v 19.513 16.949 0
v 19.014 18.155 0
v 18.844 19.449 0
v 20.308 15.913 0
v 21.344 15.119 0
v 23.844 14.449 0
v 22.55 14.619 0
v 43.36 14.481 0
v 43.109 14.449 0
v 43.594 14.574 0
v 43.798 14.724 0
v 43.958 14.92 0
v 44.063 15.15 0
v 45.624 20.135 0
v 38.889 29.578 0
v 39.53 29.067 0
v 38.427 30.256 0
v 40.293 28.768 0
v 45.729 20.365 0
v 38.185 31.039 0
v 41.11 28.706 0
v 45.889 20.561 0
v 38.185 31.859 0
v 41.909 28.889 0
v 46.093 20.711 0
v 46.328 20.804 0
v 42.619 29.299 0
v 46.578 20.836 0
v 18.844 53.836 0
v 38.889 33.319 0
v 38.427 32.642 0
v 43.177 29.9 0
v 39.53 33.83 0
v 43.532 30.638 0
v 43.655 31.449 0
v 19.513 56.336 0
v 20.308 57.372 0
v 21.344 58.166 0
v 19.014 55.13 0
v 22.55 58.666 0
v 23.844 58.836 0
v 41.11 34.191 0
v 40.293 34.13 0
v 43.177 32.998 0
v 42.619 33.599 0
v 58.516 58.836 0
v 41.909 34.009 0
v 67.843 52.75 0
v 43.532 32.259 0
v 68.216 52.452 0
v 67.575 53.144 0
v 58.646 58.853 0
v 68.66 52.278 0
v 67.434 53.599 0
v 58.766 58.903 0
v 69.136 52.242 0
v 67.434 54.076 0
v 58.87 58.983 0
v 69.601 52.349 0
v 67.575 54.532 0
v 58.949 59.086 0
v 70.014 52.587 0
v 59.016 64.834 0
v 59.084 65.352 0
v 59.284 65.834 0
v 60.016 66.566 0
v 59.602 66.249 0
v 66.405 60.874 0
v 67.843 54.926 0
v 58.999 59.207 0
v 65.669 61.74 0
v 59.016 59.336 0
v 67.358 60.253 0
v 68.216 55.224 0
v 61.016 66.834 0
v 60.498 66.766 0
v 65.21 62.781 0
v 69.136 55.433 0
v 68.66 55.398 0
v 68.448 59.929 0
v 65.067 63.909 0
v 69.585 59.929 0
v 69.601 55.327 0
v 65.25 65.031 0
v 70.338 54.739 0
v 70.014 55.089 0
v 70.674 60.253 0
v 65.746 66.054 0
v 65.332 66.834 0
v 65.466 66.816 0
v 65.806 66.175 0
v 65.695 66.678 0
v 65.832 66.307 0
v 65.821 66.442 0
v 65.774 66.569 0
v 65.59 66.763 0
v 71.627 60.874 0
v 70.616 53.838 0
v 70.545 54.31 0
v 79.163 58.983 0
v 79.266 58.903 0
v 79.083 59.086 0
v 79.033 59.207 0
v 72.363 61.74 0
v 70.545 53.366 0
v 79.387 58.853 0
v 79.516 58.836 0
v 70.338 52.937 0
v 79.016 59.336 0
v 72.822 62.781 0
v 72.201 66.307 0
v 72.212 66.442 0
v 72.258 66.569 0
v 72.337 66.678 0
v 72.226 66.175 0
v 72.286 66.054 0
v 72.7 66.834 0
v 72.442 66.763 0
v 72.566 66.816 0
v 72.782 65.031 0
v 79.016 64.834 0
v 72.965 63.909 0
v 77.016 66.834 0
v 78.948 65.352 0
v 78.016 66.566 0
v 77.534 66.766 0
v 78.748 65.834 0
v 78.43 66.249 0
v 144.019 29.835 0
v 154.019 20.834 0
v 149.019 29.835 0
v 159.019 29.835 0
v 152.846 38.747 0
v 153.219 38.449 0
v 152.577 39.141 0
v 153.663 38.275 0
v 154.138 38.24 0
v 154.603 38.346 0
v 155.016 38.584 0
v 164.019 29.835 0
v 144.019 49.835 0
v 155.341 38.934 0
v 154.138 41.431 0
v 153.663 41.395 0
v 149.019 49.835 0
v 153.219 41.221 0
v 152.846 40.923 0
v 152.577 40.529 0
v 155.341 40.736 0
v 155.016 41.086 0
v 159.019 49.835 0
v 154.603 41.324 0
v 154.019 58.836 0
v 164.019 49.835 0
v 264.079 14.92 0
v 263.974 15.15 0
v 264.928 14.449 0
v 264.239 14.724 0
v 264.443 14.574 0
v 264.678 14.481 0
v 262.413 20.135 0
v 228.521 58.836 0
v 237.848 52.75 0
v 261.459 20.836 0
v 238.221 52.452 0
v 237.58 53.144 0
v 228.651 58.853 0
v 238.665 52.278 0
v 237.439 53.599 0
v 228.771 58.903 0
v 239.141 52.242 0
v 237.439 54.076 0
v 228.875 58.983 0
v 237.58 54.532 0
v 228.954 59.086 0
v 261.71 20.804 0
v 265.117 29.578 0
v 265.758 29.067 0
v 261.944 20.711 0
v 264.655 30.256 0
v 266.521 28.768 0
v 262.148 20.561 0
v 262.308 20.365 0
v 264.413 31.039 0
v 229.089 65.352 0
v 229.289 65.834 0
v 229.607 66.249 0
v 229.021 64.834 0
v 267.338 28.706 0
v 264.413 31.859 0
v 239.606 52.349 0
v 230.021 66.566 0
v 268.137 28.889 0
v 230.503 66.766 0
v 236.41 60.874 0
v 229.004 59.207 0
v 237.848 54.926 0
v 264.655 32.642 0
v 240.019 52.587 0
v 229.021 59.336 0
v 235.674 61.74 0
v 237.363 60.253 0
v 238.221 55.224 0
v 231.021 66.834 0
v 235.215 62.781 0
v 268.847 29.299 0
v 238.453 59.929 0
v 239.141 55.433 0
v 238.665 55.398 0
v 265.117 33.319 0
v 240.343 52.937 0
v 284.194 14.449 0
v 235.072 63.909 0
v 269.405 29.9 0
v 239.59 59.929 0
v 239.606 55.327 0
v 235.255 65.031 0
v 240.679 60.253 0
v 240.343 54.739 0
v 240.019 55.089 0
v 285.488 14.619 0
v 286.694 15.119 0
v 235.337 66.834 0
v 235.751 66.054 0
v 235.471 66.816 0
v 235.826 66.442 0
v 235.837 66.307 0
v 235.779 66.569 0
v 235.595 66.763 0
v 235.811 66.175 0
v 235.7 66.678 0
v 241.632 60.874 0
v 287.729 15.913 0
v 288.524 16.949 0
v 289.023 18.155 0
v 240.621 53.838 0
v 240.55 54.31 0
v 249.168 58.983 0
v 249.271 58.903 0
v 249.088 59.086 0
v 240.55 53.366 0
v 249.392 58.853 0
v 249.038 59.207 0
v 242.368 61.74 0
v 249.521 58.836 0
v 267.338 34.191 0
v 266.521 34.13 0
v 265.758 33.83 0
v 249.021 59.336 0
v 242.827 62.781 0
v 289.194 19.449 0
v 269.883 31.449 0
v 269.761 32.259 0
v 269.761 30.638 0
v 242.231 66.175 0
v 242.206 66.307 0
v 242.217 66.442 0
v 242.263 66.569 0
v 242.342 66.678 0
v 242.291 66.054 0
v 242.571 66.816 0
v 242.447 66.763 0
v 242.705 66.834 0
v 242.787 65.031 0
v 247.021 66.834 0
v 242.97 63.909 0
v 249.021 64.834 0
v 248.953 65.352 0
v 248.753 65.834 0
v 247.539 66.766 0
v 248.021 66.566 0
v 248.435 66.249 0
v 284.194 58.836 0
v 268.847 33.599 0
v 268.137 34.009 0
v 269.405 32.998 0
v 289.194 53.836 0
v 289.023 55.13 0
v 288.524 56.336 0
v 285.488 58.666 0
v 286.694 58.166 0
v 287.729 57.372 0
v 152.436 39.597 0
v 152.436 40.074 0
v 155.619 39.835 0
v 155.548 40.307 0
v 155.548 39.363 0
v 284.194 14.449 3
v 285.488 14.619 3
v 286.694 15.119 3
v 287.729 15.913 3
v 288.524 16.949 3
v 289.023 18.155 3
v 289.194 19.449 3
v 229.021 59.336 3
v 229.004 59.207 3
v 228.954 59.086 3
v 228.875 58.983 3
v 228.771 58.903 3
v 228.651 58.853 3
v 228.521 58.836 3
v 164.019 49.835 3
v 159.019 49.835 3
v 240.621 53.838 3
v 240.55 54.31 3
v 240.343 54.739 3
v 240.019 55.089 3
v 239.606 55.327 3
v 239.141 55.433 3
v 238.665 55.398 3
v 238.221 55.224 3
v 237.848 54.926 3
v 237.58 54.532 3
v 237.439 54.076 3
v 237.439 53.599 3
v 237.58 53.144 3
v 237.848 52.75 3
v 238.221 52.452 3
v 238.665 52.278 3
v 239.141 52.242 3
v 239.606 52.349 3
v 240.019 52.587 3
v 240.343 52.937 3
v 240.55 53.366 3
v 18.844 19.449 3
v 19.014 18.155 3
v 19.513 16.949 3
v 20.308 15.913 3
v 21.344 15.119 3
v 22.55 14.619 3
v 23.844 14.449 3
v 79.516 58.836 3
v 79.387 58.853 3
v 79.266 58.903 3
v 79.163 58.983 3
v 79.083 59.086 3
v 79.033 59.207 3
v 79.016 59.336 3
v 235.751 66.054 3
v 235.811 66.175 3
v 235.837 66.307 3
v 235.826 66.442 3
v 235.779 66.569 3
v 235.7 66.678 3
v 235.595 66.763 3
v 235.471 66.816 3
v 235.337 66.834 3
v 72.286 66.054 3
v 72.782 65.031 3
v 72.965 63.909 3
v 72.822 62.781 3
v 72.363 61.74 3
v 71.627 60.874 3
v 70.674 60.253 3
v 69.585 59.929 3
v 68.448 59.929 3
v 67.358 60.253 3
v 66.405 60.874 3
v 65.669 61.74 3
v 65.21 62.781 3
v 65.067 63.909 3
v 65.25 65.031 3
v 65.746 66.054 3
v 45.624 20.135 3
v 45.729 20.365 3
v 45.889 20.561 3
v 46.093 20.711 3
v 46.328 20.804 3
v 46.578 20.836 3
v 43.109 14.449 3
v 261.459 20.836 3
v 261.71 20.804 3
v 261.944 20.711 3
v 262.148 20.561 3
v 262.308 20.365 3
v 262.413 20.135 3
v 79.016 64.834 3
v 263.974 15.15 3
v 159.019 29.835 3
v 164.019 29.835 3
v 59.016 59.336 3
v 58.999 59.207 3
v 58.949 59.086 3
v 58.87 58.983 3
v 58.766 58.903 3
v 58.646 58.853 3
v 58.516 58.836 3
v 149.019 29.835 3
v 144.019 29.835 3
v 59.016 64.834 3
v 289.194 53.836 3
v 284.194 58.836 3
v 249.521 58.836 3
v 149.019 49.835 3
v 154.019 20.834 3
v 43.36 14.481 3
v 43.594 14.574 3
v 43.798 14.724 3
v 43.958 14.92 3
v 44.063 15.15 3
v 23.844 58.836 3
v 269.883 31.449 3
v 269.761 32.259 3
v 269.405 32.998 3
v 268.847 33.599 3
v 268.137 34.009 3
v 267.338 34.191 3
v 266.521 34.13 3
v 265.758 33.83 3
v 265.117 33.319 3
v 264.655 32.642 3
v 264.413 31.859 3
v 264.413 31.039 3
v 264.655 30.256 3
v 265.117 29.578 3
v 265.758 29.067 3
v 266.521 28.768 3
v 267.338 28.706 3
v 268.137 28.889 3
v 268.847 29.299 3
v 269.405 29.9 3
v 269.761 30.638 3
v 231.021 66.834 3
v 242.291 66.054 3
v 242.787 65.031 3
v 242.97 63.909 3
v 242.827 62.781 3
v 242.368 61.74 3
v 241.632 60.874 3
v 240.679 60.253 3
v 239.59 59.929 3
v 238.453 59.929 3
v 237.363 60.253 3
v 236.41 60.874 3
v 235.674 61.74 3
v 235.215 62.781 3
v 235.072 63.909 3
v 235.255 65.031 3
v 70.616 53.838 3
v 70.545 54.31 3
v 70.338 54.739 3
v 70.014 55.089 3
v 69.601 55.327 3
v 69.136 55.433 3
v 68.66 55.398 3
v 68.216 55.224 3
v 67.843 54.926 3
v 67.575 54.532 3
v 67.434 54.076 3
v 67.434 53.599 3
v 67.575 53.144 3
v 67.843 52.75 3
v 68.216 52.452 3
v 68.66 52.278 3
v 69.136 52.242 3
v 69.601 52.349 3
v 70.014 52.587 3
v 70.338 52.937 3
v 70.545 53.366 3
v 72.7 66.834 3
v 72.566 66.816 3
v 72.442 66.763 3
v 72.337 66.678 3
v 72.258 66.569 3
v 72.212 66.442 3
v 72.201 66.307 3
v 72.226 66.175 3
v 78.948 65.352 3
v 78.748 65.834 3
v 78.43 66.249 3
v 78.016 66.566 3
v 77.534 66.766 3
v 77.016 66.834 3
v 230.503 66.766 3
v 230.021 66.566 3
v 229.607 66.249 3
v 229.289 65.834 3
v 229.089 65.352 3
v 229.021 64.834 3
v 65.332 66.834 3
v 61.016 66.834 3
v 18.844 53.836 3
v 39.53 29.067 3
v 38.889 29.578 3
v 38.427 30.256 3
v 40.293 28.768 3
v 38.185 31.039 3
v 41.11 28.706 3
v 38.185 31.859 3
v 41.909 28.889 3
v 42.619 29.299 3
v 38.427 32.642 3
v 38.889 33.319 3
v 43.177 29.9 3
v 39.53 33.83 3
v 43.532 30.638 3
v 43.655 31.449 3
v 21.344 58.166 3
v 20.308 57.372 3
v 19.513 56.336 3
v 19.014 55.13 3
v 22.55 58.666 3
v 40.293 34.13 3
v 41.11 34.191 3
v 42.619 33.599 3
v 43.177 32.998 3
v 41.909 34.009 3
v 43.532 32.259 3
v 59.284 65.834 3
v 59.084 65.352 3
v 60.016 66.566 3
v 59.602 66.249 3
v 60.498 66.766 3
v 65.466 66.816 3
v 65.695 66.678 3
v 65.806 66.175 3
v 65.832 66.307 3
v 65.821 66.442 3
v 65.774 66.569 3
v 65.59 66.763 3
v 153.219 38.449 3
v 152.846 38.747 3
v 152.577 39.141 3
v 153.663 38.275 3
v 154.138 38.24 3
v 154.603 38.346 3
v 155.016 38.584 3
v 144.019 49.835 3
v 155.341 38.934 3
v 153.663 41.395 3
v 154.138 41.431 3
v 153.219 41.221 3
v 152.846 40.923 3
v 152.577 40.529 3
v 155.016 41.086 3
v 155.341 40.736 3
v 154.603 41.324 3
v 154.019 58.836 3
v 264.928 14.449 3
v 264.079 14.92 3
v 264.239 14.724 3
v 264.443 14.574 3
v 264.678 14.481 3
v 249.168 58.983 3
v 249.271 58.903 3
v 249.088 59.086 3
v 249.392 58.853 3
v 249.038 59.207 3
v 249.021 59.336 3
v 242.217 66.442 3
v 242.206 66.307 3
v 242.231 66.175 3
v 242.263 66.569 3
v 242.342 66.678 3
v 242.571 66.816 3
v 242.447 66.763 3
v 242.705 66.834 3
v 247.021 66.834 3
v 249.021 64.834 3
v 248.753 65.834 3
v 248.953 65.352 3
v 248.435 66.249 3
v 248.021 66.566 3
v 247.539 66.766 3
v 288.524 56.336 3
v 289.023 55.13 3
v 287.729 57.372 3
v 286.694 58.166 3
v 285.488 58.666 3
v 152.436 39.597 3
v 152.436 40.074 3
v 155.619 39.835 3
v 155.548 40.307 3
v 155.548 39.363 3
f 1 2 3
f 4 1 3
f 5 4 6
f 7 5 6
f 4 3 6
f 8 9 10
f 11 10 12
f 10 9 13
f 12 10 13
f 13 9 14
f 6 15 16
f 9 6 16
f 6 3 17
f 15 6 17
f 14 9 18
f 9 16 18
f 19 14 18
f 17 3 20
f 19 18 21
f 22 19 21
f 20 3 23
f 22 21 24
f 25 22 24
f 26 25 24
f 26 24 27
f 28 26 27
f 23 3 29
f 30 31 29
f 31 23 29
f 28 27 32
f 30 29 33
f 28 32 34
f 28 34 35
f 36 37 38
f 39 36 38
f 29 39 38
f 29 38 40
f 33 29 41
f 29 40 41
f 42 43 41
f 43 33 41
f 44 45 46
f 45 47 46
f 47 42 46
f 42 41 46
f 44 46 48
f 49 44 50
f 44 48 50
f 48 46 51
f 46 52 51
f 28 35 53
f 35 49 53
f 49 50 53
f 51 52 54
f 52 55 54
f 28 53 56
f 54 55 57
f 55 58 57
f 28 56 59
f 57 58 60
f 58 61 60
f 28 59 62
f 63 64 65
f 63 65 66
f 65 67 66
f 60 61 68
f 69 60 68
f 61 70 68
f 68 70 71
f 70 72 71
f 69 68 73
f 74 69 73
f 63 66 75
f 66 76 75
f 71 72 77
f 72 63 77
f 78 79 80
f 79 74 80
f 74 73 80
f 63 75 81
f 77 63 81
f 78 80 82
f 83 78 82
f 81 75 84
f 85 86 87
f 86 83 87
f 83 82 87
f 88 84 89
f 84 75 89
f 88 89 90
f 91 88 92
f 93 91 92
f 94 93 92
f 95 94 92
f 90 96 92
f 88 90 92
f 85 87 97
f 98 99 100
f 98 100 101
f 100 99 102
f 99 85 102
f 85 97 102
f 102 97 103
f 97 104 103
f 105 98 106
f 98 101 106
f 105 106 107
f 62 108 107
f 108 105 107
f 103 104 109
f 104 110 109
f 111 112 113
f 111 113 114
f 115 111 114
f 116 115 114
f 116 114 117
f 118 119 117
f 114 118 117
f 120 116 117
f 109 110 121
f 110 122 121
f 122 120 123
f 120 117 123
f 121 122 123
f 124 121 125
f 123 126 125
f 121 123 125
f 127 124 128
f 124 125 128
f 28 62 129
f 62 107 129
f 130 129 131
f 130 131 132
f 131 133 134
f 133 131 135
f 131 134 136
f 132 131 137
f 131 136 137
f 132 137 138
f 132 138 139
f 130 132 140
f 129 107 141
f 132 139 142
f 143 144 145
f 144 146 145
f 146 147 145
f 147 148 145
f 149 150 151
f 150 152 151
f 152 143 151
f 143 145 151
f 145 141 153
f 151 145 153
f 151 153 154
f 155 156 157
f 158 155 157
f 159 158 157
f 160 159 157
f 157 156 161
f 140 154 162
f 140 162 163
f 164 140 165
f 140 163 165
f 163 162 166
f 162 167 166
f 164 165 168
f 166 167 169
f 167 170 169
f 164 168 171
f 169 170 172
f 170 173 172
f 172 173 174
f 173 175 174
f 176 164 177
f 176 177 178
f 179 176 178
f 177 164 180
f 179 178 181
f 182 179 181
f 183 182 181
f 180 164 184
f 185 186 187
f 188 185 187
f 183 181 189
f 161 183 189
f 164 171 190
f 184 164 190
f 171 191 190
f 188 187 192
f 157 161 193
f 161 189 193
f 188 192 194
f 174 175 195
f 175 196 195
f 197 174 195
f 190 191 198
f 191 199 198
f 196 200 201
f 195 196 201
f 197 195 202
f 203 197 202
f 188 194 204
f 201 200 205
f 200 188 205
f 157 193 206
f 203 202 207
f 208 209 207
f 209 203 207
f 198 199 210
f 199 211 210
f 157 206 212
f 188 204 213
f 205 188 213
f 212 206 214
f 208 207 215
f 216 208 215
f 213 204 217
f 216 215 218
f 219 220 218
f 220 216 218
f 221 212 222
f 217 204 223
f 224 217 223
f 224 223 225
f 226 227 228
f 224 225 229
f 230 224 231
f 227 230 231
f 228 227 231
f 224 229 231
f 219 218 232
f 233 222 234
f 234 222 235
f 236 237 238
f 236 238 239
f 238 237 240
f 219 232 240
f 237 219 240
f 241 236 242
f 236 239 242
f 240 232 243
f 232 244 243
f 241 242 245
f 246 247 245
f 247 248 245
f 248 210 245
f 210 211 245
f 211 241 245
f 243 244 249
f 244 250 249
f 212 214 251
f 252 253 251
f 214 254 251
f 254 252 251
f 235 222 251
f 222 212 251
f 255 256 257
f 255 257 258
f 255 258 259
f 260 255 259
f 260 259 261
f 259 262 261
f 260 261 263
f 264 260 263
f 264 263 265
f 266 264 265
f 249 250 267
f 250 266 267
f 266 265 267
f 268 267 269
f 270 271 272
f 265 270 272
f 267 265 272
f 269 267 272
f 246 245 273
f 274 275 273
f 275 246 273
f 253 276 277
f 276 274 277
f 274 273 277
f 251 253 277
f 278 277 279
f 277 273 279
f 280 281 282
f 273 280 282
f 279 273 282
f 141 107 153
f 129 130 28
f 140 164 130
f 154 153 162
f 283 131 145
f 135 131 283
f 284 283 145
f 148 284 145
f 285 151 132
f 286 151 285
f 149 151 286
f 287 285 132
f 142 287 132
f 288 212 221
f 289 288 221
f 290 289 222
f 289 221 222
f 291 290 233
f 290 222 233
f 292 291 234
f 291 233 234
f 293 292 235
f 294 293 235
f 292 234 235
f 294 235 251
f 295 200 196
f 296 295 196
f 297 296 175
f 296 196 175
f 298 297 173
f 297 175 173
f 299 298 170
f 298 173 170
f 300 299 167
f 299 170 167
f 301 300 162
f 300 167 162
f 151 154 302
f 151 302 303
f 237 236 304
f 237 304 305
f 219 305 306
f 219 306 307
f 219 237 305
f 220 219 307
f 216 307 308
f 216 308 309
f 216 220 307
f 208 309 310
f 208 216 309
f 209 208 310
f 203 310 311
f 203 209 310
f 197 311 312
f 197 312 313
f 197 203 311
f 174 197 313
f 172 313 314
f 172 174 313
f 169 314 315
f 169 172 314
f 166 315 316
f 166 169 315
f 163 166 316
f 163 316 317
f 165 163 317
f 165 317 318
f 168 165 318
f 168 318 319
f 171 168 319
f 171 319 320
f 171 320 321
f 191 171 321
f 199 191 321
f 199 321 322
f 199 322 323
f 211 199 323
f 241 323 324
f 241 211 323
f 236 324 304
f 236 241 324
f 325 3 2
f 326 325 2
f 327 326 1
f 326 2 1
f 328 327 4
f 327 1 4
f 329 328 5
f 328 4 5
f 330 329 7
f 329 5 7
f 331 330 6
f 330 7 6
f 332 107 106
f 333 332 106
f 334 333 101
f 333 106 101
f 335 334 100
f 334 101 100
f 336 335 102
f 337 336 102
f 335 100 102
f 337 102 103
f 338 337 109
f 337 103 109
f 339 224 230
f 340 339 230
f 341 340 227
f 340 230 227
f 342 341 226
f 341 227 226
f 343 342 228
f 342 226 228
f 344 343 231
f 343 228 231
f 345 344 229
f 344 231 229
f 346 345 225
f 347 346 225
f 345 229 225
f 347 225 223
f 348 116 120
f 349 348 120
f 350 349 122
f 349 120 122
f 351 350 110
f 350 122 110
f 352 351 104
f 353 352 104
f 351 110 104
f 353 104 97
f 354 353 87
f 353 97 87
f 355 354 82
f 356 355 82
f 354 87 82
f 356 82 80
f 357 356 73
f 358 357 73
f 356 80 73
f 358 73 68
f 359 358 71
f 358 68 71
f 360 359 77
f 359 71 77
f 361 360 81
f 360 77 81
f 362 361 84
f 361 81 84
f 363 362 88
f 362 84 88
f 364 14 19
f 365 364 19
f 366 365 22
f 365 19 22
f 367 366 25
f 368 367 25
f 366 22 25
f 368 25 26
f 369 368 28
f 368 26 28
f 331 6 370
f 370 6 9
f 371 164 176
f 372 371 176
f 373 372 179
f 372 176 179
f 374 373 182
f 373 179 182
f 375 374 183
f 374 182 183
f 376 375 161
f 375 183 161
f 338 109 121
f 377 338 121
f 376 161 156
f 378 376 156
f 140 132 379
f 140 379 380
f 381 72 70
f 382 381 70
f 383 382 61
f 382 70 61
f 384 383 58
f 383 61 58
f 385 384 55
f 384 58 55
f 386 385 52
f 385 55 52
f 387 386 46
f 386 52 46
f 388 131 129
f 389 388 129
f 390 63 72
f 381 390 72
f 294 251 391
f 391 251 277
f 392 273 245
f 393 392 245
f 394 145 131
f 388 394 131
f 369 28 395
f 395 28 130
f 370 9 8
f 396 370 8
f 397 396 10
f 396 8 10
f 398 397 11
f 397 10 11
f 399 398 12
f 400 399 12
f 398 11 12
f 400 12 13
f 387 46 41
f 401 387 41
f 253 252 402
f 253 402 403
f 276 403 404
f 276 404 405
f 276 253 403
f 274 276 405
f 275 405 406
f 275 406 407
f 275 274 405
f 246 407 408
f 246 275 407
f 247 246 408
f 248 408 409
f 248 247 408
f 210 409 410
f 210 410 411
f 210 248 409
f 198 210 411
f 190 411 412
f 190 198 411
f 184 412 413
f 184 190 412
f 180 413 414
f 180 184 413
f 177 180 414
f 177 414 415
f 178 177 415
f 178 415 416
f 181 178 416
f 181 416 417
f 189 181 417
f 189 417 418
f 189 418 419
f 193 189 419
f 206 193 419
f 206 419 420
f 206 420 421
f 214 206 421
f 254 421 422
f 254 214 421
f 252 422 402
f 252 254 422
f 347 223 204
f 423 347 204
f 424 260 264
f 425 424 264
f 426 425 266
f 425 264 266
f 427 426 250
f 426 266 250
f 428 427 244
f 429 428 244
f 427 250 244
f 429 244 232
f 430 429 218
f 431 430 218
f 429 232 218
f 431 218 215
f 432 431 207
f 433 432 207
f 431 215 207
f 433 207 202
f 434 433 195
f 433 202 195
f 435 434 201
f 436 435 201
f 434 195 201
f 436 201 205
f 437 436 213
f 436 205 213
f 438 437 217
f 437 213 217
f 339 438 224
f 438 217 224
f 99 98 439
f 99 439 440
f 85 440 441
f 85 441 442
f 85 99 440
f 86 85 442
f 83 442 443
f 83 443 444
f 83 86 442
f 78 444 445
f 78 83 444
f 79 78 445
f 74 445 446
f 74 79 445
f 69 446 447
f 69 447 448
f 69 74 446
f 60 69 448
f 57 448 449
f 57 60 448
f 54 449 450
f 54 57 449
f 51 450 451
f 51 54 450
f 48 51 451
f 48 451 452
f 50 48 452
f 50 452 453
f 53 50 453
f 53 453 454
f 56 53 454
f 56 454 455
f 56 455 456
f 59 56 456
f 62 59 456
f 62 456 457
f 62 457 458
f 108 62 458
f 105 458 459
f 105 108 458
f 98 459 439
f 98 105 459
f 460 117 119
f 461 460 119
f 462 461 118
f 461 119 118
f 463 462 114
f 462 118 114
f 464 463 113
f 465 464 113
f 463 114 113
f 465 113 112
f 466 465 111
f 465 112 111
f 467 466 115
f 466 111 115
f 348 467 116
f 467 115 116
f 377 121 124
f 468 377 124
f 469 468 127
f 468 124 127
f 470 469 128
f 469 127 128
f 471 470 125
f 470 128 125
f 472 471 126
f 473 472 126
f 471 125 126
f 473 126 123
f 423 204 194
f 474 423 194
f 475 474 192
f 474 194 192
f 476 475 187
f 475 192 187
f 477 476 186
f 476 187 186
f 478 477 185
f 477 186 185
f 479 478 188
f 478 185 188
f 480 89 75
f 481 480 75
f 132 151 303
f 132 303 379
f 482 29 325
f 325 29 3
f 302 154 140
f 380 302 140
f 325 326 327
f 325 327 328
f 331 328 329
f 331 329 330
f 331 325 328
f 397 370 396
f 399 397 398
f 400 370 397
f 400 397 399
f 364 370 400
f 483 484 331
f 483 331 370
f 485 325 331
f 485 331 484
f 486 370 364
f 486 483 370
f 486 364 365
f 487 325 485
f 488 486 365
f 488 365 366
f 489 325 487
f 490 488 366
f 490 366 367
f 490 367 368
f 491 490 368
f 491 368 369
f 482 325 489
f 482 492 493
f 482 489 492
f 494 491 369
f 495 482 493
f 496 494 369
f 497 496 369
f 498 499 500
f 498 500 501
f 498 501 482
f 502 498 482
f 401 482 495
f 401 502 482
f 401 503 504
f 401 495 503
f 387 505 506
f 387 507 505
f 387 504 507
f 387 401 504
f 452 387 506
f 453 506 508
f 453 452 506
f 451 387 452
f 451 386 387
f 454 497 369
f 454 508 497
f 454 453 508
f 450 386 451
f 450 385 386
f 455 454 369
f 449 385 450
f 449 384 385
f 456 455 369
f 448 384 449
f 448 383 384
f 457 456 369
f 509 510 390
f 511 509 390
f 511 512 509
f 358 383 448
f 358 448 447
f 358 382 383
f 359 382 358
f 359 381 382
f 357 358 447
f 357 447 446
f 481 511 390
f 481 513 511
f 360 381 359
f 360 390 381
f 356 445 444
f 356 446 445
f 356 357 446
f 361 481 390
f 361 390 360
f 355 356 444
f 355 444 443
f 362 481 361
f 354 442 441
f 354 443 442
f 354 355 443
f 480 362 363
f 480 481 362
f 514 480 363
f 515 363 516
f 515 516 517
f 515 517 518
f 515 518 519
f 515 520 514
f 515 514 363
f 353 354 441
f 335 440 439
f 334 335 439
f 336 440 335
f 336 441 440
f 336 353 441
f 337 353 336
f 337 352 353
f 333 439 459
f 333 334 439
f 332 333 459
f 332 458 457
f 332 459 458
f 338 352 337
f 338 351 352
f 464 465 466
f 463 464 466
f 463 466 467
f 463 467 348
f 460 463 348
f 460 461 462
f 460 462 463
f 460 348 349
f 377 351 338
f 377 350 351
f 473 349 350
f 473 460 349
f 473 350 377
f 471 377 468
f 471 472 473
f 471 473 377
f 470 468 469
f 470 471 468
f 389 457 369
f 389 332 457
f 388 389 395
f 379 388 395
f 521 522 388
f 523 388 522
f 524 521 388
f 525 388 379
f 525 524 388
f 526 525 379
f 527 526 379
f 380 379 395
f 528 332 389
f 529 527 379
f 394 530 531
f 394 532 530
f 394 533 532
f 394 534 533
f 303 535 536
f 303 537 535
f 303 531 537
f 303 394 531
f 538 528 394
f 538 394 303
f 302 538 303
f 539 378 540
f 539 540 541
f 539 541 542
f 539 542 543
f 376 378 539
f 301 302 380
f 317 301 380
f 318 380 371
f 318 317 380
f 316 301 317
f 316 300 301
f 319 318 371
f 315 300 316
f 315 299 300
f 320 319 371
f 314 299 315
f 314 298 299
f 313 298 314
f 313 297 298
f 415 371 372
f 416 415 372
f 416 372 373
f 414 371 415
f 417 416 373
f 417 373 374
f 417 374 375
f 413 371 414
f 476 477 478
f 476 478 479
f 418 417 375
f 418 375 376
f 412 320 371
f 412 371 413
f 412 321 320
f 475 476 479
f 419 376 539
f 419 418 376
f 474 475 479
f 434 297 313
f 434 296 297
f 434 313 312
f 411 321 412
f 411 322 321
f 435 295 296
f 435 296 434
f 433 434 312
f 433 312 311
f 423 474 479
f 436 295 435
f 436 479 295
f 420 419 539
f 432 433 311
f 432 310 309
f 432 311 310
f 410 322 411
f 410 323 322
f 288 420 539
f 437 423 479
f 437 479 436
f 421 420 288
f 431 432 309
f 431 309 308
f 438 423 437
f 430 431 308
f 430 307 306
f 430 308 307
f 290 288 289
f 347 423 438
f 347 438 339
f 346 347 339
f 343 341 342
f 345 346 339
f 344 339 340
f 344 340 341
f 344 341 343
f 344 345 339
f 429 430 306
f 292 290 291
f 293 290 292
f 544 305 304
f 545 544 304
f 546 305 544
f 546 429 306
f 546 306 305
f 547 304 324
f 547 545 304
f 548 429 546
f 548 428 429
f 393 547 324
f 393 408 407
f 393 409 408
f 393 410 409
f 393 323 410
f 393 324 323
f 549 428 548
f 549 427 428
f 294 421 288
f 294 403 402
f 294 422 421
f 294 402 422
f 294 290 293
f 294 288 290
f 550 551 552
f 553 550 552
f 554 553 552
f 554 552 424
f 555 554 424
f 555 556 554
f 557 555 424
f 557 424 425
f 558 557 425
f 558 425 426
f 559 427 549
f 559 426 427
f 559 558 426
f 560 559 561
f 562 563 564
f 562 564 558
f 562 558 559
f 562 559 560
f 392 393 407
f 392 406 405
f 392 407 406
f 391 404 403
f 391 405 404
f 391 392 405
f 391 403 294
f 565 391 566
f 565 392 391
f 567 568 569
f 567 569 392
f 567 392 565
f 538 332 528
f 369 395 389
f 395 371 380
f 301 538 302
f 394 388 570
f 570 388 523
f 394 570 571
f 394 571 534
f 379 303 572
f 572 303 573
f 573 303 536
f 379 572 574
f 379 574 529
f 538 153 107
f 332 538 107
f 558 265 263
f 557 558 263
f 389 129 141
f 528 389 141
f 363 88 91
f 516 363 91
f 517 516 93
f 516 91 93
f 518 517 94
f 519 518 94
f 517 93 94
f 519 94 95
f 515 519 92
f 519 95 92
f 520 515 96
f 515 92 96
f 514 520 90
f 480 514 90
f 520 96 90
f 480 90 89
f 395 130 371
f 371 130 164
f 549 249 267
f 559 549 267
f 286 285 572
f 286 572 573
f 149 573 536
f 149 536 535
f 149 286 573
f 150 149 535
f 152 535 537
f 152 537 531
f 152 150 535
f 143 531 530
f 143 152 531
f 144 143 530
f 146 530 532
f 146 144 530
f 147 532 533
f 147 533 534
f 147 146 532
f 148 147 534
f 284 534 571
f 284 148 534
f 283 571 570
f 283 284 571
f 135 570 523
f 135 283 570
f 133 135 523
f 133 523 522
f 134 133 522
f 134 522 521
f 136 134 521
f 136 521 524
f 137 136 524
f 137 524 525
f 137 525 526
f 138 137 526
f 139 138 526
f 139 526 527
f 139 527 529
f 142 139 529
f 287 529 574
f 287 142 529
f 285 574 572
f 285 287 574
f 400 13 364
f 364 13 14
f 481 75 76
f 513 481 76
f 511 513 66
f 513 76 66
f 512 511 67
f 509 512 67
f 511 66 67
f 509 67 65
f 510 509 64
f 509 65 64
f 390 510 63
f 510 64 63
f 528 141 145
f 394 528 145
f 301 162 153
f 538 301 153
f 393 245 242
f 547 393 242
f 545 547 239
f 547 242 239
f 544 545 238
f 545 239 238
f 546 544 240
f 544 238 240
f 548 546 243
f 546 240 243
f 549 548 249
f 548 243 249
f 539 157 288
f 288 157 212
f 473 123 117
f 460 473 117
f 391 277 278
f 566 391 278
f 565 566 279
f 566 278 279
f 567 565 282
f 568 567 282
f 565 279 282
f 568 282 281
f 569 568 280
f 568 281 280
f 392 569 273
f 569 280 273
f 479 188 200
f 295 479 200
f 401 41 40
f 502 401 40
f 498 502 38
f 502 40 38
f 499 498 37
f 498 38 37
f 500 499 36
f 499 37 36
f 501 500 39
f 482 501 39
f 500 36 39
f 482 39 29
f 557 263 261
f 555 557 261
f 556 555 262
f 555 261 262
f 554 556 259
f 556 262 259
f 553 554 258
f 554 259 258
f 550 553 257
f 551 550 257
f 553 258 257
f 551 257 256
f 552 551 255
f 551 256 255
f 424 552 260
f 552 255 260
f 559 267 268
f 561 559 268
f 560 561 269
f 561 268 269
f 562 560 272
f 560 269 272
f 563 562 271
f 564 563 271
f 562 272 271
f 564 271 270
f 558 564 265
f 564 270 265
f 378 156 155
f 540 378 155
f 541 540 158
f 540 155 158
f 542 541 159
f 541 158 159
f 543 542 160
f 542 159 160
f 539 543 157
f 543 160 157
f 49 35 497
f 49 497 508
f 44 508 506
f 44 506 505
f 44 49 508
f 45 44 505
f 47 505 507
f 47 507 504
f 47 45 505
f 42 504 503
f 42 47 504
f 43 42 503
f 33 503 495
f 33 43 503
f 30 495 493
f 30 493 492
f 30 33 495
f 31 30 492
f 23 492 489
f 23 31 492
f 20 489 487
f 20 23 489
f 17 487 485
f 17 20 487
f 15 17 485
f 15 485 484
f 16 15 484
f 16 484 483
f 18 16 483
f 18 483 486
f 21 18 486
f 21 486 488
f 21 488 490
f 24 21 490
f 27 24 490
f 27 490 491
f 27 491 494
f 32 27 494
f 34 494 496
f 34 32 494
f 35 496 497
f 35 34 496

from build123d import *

# Parameters (mm, degrees)
MODEL_R                 = 1.6
MODEL_R_2               = 2.75
SALIENTE_EXTRUIR1_DEPTH = 3


with BuildPart() as part:
    # Model → Saliente-Extruir1 (new body)
    with BuildSketch(Plane.XY):
        with BuildLine():
            Line((154.018604018, 58.836275918), (79.516105518, 58.836274418))
            ThreePointArc((79.516105518, 58.836274418), (79.162552127, 58.982721028), (79.016105518, 59.336274418))
            Line((79.016105518, 59.336274418), (79.016105518, 64.834297418))
            ThreePointArc((79.016105518, 64.834297418), (78.43031908, 66.248510981), (77.016105518, 66.834297418))
            Line((77.016105518, 66.834297418), (72.69995292, 66.834297418))
            ThreePointArc((72.69995292, 66.834297418), (72.258226513, 66.568557489), (72.286037482, 66.053808542))
            ThreePointArc((72.286037482, 66.053808542), (69.016105518, 59.887946419), (65.746173553, 66.053808542))
            ThreePointArc((65.746173553, 66.053808542), (65.773984522, 66.56855749), (65.332258115, 66.834297418))
            Line((65.332258115, 66.834297418), (61.016105518, 66.834297418))
            ThreePointArc((61.016105518, 66.834297418), (59.601891956, 66.248510981), (59.016105518, 64.834297418))
            Line((59.016105518, 64.834297418), (59.016105518, 59.336277418))
            ThreePointArc((59.016105518, 59.336277418), (58.869658908, 58.982724028), (58.516105518, 58.836277418))
            Line((58.516105518, 58.836277418), (28.843601518, 58.836277418))
            Line((28.843601518, 58.836277418), (23.843601518, 58.836277418))
            ThreePointArc((23.843601518, 58.836277418), (20.308067612, 57.371811324), (18.843601518, 53.836277418))
            Line((18.843601518, 53.836277418), (18.843601518, 19.448682418))
            ThreePointArc((18.843601518, 19.448682418), (20.308068445, 15.91314768), (23.843603874, 14.448682418))
            Line((23.843603874, 14.448682418), (43.108834237, 14.448682418))
            ThreePointArc((43.108834237, 14.448682418), (43.70094804, 14.642828062), (44.063149212, 15.149879929))
            Line((44.063149212, 15.149879929), (45.624053822, 20.135094908))
            ThreePointArc((45.624053822, 20.135094908), (45.986254995, 20.642146775), (46.578368798, 20.836292418))
            Line((46.578368798, 20.836292418), (154.018604018, 20.833862066))
            Line((154.018604018, 20.833862066), (261.458839238, 20.836292418))
            ThreePointArc((261.458839238, 20.836292418), (262.050953041, 20.642146775), (262.413154213, 20.135094908))
            Line((262.413154213, 20.135094908), (263.974058823, 15.149879929))
            ThreePointArc((263.974058823, 15.149879929), (264.336259996, 14.642828062), (264.928373799, 14.448682418))
            Line((264.928373799, 14.448682418), (284.193604162, 14.448682418))
            ThreePointArc((284.193604162, 14.448682418), (287.729139591, 15.91314768), (289.193606518, 19.448682418))
            Line((289.193606518, 19.448682418), (289.193606518, 53.836277418))
            ThreePointArc((289.193606518, 53.836277418), (287.729140424, 57.371811324), (284.193606518, 58.836277418))
            Line((284.193606518, 58.836277418), (279.193606518, 58.836277418))
            Line((279.193606518, 58.836277418), (249.521102518, 58.836277418))
            ThreePointArc((249.521102518, 58.836277418), (249.167549127, 58.982724028), (249.021102518, 59.336277418))
            Line((249.021102518, 59.336277418), (249.021102518, 64.834297418))
            ThreePointArc((249.021102518, 64.834297418), (248.43531608, 66.248510981), (247.021102518, 66.834297418))
            Line((247.021102518, 66.834297418), (242.704949921, 66.834297418))
            ThreePointArc((242.704949921, 66.834297418), (242.263223513, 66.56855749), (242.291034482, 66.053808542))
            ThreePointArc((242.291034482, 66.053808542), (239.021102518, 59.887946419), (235.751170554, 66.053808542))
            ThreePointArc((235.751170554, 66.053808542), (235.778981523, 66.568557489), (235.337255116, 66.834297418))
            Line((235.337255116, 66.834297418), (231.021102518, 66.834297418))
            ThreePointArc((231.021102518, 66.834297418), (229.606888956, 66.248510981), (229.021102518, 64.834297418))
            Line((229.021102518, 64.834297418), (229.021102518, 59.336274418))
            ThreePointArc((229.021102518, 59.336274418), (228.874655908, 58.982721028), (228.521102518, 58.836274418))
            Line((228.521102518, 58.836274418), (154.018604018, 58.836275918))
        make_face()
        with Locations((69.016105518, 53.837946418)):
            Circle(MODEL_R, mode=Mode.SUBTRACT)
        with Locations((154.018604018, 39.835068992)):
            Circle(MODEL_R, mode=Mode.SUBTRACT)
        with Locations((239.021102518, 53.837946418)):
            Circle(MODEL_R, mode=Mode.SUBTRACT)
        with Locations((40.904504018, 31.448682418)):
            Circle(MODEL_R_2, mode=Mode.SUBTRACT)
        with Locations((267.132704018, 31.448682418)):
            Circle(MODEL_R_2, mode=Mode.SUBTRACT)
        Polygon((144.018604018, 39.835068992), (144.018604018, 49.835068992), (149.018604018, 49.835068992), (149.018604018, 29.835068992), (144.018604018, 29.835068992), align=None, mode=Mode.SUBTRACT)
        Polygon((164.018604018, 39.835068992), (164.018604018, 49.835068992), (159.018604018, 49.835068992), (159.018604018, 29.835068992), (164.018604018, 29.835068992), align=None, mode=Mode.SUBTRACT)
    extrude(amount=SALIENTE_EXTRUIR1_DEPTH)


solid = part.part
